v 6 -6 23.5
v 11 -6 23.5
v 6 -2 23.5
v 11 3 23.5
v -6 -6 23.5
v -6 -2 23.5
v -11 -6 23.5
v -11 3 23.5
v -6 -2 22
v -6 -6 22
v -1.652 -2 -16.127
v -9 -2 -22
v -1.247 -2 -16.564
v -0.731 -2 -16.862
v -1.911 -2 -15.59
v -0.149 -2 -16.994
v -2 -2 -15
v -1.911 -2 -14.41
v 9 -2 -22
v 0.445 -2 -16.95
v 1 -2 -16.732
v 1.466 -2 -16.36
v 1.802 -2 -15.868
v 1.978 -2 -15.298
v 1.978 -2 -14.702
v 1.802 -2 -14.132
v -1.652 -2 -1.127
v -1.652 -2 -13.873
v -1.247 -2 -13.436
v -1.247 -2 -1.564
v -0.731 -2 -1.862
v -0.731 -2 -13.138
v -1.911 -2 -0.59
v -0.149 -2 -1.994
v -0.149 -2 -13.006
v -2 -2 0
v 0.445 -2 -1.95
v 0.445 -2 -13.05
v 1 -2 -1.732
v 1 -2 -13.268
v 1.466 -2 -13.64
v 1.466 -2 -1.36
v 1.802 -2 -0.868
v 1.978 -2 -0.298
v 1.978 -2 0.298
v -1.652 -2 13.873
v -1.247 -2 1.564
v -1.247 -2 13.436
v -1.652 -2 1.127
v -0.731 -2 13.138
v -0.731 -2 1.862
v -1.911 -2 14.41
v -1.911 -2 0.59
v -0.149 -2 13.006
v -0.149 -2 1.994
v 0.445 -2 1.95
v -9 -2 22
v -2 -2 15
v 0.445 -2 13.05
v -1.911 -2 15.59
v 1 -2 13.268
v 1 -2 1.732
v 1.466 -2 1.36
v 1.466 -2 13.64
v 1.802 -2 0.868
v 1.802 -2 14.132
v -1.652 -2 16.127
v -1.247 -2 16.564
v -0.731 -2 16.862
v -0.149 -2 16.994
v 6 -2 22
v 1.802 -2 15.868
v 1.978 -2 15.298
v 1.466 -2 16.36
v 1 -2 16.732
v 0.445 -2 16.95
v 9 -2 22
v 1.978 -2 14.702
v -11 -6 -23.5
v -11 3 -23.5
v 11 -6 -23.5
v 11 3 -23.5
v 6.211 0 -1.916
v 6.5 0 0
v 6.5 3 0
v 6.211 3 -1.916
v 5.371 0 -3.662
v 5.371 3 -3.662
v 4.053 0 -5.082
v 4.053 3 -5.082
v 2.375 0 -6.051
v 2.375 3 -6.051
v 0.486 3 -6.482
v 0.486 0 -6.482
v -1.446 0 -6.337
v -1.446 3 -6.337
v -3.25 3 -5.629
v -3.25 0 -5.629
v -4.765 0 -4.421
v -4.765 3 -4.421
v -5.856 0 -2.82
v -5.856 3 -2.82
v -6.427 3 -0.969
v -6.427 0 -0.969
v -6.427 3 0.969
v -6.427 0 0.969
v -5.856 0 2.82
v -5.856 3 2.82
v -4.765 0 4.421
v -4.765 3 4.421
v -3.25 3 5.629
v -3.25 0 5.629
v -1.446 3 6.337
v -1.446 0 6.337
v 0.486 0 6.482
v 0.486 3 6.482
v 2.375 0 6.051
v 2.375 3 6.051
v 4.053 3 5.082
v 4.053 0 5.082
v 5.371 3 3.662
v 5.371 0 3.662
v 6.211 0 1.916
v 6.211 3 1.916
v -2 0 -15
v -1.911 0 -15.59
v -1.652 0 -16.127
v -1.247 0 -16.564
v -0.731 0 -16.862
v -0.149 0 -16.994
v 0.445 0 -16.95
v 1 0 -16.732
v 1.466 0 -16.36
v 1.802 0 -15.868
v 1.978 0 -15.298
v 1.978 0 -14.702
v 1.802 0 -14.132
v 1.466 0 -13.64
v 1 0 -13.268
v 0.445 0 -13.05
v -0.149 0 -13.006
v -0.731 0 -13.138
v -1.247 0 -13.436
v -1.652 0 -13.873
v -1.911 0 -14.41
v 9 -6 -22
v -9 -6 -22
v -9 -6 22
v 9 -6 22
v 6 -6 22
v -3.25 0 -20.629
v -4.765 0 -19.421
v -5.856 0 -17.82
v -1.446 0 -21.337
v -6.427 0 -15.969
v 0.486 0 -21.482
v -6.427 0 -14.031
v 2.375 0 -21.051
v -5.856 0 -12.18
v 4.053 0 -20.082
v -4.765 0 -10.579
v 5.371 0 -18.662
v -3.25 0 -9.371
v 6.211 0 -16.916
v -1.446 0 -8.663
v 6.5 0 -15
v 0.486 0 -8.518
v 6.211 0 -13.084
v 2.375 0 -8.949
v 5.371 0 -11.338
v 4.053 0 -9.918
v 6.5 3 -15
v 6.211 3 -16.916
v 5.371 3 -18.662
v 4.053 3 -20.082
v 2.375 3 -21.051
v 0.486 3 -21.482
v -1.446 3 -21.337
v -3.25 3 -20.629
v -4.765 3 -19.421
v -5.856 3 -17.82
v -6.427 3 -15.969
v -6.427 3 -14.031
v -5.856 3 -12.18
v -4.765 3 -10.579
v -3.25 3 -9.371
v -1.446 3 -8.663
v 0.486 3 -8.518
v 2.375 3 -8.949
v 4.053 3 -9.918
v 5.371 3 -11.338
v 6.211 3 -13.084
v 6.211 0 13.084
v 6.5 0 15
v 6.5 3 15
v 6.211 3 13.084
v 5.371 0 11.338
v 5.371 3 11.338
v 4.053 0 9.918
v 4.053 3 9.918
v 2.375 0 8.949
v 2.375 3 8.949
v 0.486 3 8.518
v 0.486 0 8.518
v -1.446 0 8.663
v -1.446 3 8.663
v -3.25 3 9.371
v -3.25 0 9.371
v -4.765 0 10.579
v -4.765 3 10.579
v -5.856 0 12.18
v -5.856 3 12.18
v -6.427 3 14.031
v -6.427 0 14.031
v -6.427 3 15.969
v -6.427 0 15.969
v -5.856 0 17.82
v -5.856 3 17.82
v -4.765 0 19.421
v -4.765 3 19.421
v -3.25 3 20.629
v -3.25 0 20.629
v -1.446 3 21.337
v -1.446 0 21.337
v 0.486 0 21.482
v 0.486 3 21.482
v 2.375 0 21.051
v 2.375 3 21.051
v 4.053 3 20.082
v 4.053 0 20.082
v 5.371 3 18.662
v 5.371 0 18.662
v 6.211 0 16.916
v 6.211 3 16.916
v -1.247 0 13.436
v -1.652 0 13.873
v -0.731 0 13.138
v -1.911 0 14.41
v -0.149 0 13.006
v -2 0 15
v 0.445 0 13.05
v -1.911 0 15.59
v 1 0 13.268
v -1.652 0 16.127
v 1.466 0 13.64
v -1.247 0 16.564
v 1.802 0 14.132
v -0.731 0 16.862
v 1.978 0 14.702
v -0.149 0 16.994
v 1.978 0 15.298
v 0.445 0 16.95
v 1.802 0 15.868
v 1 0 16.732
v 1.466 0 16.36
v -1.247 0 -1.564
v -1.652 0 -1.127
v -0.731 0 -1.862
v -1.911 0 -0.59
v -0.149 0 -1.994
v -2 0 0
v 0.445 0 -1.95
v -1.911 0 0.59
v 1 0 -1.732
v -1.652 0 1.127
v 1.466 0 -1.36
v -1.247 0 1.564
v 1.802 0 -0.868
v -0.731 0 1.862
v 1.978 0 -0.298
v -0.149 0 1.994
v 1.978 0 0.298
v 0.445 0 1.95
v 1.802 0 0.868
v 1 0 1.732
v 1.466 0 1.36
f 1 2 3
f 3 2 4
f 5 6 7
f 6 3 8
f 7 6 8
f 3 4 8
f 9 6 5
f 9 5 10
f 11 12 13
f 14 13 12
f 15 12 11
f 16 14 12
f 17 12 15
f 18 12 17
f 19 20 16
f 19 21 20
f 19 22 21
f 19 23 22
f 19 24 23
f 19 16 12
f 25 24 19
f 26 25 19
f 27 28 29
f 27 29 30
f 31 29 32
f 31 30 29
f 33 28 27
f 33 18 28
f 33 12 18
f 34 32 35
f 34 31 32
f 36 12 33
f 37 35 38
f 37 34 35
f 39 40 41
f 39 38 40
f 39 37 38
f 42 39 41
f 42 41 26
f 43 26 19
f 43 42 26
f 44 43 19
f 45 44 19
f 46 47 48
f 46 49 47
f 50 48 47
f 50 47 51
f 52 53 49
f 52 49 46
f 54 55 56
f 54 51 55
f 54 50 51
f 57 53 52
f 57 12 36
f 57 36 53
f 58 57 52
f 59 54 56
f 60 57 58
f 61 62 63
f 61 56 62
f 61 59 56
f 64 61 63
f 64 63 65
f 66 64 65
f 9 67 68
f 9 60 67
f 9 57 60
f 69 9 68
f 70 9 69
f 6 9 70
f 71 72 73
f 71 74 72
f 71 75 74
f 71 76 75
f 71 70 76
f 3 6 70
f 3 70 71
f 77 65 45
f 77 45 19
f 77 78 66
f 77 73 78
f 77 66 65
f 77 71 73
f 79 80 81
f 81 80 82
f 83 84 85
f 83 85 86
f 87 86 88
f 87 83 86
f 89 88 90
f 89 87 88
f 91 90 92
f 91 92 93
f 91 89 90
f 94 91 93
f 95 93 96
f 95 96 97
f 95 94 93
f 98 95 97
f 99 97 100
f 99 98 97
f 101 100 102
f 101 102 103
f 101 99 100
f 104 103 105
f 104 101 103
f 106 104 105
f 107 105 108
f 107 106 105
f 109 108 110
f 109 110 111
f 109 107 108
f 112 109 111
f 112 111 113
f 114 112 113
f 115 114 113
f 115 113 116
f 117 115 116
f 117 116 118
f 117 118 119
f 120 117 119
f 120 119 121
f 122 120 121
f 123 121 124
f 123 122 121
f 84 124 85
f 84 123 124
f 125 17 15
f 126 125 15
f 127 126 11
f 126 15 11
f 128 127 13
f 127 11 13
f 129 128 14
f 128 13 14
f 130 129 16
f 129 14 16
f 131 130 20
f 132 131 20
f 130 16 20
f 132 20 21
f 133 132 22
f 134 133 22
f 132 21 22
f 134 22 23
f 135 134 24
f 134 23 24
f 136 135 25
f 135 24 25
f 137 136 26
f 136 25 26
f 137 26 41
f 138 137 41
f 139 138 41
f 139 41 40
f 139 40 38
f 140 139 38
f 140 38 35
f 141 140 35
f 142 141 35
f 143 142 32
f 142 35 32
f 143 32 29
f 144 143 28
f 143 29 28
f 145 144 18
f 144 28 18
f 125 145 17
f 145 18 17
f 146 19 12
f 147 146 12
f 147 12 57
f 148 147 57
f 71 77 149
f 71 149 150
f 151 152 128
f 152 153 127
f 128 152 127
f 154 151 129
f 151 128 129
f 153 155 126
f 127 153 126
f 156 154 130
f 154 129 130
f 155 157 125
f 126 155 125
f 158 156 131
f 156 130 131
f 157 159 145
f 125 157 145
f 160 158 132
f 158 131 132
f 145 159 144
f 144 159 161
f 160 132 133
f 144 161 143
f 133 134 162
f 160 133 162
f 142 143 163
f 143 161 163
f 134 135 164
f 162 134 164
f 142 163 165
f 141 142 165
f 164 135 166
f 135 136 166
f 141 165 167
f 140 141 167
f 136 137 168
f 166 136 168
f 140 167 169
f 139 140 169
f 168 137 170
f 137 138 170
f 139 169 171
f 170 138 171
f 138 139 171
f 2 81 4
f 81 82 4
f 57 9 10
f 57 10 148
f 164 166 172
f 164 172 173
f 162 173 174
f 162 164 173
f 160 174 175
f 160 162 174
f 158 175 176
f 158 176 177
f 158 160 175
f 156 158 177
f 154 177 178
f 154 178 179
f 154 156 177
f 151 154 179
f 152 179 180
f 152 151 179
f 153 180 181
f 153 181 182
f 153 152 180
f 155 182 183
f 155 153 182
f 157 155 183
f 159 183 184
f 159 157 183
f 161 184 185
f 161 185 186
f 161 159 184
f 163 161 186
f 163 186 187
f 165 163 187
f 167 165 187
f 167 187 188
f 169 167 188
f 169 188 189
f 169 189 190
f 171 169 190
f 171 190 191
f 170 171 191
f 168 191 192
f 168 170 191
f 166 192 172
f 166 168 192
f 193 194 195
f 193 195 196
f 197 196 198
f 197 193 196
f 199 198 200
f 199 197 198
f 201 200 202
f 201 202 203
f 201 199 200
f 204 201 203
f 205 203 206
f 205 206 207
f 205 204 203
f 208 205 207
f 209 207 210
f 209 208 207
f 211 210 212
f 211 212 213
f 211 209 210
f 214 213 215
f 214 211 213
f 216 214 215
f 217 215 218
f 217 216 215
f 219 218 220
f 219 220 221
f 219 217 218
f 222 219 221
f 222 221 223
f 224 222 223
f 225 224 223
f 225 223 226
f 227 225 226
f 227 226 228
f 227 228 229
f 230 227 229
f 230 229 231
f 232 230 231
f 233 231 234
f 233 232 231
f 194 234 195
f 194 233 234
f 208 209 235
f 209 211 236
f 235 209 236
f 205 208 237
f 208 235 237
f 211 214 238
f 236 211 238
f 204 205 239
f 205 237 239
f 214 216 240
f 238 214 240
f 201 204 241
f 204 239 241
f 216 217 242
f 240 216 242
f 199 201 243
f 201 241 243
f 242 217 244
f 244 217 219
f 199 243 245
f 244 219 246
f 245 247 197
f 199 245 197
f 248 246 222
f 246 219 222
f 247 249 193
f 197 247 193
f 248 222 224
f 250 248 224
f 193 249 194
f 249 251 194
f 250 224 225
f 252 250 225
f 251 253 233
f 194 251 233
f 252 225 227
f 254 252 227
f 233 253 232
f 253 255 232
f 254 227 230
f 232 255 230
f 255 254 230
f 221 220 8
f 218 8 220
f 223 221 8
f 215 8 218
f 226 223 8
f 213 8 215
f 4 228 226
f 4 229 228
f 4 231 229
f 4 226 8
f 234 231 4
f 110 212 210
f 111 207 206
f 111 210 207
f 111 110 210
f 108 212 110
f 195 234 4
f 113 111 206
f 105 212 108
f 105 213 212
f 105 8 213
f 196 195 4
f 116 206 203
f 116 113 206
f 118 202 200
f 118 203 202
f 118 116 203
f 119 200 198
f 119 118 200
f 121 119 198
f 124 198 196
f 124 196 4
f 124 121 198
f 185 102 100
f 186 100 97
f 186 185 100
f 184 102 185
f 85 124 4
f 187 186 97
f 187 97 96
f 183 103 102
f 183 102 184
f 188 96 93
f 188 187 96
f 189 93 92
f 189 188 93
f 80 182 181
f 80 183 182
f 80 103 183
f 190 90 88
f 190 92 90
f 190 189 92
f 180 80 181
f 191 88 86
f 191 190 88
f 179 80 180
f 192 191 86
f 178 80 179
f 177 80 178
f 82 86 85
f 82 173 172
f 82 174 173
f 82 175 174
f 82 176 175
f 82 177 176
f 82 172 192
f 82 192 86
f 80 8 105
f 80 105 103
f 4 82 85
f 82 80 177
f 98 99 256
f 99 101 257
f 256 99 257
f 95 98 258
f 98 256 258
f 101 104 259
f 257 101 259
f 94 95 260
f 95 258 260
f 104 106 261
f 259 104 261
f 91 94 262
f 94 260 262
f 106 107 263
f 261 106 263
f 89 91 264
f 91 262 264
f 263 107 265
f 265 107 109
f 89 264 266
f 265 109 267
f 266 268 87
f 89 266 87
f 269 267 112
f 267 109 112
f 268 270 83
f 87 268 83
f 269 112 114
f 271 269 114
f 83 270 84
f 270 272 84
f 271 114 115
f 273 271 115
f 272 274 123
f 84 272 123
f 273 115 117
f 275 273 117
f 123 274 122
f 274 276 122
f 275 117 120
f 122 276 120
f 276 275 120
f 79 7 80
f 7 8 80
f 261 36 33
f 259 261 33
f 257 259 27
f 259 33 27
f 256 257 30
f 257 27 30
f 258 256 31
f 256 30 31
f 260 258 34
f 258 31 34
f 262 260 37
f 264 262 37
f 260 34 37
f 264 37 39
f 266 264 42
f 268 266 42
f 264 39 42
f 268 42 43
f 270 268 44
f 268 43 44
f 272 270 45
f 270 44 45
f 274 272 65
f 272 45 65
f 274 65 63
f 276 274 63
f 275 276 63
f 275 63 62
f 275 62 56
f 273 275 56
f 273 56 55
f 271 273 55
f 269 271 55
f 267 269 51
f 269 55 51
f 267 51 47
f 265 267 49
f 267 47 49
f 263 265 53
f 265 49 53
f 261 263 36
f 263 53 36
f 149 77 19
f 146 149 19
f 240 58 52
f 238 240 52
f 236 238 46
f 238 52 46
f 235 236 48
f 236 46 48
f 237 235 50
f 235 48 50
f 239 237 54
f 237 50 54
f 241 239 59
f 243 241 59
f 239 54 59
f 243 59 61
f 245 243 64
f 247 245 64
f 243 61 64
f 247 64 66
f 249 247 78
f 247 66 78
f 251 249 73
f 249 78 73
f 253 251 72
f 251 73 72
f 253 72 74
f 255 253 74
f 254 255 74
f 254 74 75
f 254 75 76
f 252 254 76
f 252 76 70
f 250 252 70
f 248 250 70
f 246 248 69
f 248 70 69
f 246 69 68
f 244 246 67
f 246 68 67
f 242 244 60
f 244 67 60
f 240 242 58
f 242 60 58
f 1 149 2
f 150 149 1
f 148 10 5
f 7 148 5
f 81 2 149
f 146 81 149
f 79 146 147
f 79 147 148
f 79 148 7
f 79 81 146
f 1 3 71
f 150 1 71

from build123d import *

# Parameters (mm, degrees)
SKETCH2_W           = 22
SKETCH2_H           = 47
SKETCH2_R           = 6.5
BOSS_EXTRUDE1_DEPTH = 3
SKETCH3_W           = 22
SKETCH3_H           = 47
BOSS_EXTRUDE2_DEPTH = 2
BOSS_EXTRUDE3_DEPTH = 4
SKETCH5_5_R         = 2
BOSS_EXTRUDE6_DEPTH = 1
SKETCH5_6_R         = 2
CUT_EXTRUDE1_DEPTH  = 2
SKETCH5_7_W         = 3
SKETCH5_7_H         = 1.5
BOSS_EXTRUDE7_DEPTH = 4


with BuildPart() as part:
    # Sketch2 → Boss-Extrude1 (new body)
    with BuildSketch(Plane(origin=(0, 0, 0), x_dir=(1, 0, 0), z_dir=(0, 1, 0))):
        Rectangle(SKETCH2_W, SKETCH2_H)
        Circle(SKETCH2_R, mode=Mode.SUBTRACT)
        with Locations((0, 15)):
            Circle(SKETCH2_R, mode=Mode.SUBTRACT)
        with Locations((0, -15)):
            Circle(SKETCH2_R, mode=Mode.SUBTRACT)
    extrude(amount=BOSS_EXTRUDE1_DEPTH)

    # Sketch3 → Boss-Extrude2 (add)
    with BuildSketch(Plane.XZ):
        Rectangle(SKETCH3_W, SKETCH3_H)
    extrude(amount=BOSS_EXTRUDE2_DEPTH)

    # Sketch5 → Boss-Extrude3 (add)
    with BuildSketch(Plane(origin=(0, -2, 0), x_dir=(-1, 0, 0), z_dir=(0, -1, 0))):
        Polygon((9, 22), (9, -22), (9, -23.5), (11, -23.5), (11, 23.5), (-11, 23.5), (-11, -23.5), (-9, -23.5), (-9, -22), (-9, 22), align=None)
    extrude(amount=BOSS_EXTRUDE3_DEPTH)

    # Sketch5<5> → Boss-Extrude6 (add)
    with BuildSketch(Plane(origin=(0, -2, 0), x_dir=(-1, 0, 0), z_dir=(0, -1, 0))):
        Circle(SKETCH5_5_R)
    extrude(amount=-BOSS_EXTRUDE6_DEPTH)

    # Sketch5<6> → Cut-Extrude1 (cut)
    with BuildSketch(Plane(origin=(0, -2, 0), x_dir=(-1, 0, 0), z_dir=(0, -1, 0))):
        Circle(SKETCH5_6_R)
        with Locations((0, -15)):
            Circle(SKETCH5_6_R)
        with Locations((0, 15)):
            Circle(SKETCH5_6_R)
    extrude(amount=-CUT_EXTRUDE1_DEPTH, mode=Mode.SUBTRACT)

    # Sketch5<7> → Boss-Extrude7 (add)
    with BuildSketch(Plane(origin=(0, -2, 0), x_dir=(-1, 0, 0), z_dir=(0, -1, 0))):
        with Locations((7.5, -22.75)):
            Rectangle(SKETCH5_7_W, SKETCH5_7_H)
        with Locations((-7.5, -22.75)):
            Rectangle(SKETCH5_7_W, SKETCH5_7_H)
    extrude(amount=BOSS_EXTRUDE7_DEPTH)


solid = part.part
